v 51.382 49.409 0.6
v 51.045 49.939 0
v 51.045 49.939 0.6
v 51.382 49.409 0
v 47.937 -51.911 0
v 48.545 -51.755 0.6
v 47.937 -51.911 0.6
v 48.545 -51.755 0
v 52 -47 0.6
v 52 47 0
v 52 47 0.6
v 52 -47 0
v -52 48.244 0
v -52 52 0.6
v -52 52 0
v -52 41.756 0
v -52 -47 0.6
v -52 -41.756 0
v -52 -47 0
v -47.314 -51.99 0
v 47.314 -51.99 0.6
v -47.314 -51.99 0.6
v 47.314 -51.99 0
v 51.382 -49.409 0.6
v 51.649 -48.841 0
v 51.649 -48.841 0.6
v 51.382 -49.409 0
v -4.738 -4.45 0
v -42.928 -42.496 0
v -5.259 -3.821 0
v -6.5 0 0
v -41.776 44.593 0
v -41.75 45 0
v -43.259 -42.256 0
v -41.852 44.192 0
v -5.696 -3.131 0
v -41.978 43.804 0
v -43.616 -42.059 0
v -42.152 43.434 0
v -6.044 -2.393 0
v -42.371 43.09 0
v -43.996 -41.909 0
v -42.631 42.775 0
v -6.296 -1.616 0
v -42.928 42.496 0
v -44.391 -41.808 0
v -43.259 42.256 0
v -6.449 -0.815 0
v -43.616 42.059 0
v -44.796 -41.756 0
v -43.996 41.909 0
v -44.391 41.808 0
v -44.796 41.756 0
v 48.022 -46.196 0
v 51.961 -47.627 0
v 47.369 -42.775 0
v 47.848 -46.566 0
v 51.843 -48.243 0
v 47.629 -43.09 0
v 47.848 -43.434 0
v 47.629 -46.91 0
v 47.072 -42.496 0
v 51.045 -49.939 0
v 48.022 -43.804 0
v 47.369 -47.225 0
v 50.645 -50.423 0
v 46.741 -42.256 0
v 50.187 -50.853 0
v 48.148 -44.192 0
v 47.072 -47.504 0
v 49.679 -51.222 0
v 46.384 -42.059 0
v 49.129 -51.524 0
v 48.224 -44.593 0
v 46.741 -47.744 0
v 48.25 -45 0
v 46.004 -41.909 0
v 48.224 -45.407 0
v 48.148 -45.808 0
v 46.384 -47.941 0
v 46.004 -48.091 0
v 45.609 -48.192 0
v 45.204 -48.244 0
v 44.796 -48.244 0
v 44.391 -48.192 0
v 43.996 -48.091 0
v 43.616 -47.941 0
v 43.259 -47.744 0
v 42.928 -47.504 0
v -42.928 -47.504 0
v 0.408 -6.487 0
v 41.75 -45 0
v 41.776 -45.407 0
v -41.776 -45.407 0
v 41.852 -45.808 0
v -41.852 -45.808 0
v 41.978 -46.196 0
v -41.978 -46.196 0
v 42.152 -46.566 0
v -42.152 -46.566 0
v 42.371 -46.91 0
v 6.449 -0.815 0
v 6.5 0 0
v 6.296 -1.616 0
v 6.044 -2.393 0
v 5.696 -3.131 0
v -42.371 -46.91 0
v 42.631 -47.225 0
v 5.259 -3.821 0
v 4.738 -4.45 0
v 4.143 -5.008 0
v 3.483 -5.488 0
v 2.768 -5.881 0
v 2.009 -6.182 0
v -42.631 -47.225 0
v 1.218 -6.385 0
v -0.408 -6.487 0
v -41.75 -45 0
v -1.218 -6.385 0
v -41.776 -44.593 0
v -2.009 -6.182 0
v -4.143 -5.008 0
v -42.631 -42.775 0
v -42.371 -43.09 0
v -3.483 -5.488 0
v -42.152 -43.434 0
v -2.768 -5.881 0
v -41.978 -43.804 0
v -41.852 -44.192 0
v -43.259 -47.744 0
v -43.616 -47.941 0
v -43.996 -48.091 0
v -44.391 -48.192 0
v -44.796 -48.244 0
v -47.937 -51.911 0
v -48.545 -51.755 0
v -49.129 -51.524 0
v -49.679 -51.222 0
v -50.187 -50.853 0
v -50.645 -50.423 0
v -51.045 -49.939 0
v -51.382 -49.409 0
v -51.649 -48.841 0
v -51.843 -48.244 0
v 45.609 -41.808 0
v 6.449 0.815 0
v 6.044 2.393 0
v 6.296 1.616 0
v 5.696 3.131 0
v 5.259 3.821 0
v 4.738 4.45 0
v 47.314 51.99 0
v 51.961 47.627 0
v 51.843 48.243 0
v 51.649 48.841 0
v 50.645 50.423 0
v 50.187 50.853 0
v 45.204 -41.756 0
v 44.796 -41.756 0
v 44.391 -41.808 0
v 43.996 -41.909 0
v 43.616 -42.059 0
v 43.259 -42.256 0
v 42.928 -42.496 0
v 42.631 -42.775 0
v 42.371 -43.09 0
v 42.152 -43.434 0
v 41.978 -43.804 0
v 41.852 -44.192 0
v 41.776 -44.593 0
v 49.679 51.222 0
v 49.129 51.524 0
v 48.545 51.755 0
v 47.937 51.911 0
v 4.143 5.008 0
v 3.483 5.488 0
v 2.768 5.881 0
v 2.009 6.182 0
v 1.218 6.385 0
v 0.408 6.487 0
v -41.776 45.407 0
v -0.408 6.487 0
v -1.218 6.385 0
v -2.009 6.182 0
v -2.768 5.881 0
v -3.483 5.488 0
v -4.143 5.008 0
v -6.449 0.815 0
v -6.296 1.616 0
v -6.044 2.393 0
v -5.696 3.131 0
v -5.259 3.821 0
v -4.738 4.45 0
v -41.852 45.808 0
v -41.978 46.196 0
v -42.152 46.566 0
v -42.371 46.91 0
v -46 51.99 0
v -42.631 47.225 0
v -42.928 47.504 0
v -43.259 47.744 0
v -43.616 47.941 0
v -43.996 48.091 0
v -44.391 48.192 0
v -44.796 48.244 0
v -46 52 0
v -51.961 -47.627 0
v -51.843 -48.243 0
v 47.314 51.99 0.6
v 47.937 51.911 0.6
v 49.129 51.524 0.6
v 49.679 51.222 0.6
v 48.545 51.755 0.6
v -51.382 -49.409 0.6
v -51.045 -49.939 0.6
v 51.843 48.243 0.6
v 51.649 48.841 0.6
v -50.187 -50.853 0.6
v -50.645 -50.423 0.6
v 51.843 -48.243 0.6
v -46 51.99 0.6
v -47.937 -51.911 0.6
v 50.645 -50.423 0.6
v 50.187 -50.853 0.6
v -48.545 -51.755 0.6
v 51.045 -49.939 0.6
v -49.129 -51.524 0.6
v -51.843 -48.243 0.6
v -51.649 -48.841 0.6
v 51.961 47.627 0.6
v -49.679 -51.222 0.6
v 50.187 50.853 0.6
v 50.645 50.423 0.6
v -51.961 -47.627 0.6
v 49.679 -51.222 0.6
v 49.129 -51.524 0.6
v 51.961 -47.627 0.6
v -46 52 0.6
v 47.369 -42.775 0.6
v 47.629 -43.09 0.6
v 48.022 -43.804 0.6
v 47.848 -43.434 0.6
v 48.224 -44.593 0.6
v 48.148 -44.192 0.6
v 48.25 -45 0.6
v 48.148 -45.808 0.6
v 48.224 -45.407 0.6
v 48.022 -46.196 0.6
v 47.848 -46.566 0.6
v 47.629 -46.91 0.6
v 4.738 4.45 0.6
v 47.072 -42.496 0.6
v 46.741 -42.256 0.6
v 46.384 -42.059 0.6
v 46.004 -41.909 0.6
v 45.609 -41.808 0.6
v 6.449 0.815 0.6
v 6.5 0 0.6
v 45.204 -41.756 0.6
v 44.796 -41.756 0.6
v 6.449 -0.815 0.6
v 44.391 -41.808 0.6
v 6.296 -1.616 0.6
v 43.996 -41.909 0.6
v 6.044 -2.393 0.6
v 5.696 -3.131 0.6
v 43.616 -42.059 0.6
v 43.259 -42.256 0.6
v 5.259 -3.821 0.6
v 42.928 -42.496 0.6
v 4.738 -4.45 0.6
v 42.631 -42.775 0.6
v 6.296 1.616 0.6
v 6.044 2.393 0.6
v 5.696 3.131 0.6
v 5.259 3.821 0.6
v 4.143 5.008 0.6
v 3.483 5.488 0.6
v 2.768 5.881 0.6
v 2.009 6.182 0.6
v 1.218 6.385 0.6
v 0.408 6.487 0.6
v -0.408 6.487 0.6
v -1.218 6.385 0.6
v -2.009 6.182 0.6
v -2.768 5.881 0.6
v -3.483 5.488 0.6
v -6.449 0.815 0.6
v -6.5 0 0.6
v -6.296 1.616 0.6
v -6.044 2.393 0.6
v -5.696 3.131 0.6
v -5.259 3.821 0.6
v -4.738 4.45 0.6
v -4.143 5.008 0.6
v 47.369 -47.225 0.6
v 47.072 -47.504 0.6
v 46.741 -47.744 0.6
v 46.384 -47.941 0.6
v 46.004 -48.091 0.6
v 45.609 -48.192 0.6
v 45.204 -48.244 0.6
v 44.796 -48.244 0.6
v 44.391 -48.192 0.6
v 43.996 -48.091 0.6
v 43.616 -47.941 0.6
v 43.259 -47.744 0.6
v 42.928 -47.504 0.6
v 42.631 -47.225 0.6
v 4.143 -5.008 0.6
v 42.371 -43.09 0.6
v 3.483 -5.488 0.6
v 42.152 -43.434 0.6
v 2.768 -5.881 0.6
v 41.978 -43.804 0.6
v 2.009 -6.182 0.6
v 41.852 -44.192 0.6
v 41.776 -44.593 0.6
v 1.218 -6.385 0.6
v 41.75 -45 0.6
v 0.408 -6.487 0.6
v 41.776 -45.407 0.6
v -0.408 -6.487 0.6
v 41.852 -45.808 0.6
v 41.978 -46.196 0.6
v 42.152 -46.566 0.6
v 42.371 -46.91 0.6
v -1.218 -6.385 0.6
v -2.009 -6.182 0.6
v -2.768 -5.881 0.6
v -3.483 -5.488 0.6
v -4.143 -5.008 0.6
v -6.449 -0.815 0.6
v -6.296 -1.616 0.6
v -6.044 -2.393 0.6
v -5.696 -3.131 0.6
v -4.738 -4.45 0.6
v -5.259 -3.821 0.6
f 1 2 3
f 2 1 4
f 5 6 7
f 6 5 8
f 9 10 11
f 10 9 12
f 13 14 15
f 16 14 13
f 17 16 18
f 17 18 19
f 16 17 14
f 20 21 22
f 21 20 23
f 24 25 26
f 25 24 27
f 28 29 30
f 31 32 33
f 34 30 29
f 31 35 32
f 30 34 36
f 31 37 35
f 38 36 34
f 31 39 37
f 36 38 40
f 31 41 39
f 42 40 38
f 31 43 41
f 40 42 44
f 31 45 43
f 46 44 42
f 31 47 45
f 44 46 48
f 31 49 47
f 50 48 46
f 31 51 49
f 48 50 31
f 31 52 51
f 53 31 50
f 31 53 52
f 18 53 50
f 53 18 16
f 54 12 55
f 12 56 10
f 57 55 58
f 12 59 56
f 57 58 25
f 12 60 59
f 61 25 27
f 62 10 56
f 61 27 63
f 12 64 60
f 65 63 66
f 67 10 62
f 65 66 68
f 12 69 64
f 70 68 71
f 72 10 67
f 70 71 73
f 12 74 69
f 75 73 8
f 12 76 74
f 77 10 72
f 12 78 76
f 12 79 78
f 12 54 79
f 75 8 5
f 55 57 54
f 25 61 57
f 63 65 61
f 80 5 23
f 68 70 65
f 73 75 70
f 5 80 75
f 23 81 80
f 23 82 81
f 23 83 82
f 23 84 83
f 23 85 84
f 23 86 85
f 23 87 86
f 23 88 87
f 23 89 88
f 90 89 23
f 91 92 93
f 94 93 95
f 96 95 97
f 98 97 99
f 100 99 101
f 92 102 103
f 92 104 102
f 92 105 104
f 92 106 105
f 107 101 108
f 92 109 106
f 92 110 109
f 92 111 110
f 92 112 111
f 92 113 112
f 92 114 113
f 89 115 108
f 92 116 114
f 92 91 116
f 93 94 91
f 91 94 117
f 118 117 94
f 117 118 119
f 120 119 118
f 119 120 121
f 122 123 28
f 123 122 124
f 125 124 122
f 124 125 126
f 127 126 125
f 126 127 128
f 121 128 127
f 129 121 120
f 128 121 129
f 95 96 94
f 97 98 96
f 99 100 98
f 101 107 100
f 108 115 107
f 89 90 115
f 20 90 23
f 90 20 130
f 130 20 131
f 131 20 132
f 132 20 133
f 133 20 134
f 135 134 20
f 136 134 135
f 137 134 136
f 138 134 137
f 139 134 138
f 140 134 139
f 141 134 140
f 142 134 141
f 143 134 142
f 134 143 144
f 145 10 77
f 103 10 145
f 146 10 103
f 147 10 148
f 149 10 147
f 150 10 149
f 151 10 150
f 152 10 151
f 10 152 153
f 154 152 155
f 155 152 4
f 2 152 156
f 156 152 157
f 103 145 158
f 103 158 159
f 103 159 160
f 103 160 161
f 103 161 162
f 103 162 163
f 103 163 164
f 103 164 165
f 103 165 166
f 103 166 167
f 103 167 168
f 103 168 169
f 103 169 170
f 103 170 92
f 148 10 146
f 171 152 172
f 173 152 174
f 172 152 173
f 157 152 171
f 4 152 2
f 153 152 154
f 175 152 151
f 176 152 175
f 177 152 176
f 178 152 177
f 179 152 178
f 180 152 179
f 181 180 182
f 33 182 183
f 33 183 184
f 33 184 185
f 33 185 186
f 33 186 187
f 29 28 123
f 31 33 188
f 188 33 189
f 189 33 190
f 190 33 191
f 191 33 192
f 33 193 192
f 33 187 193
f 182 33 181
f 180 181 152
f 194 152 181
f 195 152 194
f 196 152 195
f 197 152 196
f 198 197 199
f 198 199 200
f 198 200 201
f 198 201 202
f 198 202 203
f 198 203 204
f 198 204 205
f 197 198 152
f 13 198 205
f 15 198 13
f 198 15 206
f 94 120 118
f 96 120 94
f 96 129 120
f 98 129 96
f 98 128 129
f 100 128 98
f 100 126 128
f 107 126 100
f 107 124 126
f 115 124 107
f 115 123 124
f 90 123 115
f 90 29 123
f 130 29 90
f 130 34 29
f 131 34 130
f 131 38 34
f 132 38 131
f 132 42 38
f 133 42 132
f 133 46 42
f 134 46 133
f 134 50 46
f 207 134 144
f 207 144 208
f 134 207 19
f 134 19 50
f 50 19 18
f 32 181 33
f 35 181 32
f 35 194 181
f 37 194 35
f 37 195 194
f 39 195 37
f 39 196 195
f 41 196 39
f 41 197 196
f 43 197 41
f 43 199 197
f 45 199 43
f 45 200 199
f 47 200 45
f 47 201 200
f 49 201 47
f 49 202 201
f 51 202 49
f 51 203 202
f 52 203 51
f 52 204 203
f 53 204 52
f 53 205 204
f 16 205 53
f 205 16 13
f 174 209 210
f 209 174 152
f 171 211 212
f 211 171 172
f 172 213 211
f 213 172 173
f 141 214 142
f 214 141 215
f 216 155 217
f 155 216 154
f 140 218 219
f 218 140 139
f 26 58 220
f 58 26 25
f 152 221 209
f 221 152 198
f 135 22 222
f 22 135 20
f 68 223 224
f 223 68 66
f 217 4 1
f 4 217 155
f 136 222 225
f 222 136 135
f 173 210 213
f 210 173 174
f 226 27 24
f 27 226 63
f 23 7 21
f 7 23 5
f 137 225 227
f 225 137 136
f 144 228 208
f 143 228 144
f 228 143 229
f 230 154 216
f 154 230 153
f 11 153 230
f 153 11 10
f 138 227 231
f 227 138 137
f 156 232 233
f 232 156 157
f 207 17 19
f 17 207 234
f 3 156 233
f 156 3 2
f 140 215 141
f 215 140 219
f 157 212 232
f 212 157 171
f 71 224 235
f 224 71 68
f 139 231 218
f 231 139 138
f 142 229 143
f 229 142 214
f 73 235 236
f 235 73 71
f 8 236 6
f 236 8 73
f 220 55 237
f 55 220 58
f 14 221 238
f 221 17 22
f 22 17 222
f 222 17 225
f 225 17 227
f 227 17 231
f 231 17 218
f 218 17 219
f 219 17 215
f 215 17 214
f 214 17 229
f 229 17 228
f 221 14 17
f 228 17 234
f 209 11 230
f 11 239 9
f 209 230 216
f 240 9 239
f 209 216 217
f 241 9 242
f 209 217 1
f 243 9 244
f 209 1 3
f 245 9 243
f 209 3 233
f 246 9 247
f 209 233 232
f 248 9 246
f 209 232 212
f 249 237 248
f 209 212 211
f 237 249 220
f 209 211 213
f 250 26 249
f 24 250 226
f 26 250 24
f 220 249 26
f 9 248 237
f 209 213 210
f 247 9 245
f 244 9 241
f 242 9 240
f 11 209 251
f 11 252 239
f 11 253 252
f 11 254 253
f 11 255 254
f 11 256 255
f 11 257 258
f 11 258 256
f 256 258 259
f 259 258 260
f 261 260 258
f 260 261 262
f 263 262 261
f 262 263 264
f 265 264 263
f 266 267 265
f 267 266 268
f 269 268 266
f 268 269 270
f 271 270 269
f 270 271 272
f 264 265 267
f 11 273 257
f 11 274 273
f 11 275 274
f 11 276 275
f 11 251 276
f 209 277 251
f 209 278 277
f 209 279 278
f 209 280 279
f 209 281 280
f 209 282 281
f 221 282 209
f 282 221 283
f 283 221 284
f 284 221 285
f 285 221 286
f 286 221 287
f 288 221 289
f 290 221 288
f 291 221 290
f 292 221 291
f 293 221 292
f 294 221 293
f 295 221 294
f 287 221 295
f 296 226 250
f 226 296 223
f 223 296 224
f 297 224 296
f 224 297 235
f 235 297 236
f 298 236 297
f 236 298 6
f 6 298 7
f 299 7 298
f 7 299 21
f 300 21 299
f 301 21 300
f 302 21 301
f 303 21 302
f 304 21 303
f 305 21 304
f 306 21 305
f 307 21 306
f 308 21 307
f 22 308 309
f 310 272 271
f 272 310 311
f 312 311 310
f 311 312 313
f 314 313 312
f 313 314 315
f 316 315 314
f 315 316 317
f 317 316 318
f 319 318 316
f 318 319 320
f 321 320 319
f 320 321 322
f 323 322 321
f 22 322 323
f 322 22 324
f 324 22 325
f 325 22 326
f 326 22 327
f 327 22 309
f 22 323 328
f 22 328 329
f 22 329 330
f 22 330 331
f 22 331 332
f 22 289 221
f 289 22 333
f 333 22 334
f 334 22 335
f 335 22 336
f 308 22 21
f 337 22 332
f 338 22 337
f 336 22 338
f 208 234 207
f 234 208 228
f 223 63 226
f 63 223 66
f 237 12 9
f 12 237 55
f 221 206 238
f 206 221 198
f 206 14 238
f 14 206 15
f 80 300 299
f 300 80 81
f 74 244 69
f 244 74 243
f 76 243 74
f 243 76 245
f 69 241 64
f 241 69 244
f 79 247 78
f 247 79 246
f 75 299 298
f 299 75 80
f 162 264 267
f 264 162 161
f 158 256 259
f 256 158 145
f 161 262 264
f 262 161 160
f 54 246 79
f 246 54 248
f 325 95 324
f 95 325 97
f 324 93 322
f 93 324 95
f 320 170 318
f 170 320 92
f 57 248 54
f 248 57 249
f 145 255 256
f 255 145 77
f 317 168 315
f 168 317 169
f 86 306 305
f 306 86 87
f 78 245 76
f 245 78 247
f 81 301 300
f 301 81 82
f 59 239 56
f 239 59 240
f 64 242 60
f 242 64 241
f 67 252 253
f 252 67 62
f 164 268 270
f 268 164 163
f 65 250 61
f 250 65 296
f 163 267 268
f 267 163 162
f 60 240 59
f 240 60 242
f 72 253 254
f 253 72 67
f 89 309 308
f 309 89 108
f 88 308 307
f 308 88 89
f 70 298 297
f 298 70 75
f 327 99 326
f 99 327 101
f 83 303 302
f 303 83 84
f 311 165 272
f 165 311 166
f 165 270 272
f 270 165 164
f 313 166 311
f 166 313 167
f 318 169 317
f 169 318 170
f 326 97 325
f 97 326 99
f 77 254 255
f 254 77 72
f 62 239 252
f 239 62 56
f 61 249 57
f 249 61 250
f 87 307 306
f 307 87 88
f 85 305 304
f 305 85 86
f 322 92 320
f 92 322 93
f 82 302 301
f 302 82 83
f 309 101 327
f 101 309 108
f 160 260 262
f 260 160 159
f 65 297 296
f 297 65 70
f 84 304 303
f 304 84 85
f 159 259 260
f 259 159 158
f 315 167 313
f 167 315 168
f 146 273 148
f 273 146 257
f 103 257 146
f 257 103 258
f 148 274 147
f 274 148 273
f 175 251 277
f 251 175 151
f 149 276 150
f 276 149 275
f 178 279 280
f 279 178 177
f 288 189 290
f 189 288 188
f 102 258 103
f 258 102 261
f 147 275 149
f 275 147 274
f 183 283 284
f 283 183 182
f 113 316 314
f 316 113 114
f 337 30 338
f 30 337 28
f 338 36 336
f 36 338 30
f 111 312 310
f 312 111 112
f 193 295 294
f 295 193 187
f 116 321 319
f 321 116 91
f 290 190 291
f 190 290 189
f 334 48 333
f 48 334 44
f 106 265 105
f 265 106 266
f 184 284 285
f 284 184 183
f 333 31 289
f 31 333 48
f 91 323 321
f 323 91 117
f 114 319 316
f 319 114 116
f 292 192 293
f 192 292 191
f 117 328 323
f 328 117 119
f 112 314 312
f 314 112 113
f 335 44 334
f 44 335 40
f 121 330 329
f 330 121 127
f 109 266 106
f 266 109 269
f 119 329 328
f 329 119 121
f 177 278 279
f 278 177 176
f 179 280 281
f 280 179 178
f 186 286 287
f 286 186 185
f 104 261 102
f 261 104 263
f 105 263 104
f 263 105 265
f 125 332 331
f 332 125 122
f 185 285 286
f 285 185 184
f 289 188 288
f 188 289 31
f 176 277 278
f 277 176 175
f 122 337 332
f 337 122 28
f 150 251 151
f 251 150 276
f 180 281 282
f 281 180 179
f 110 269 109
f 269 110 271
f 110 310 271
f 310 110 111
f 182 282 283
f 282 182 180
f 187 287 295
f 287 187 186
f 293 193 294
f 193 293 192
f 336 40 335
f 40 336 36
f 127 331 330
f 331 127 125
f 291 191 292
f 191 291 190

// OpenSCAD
$fn = 50;


difference() {
	union() {
		hull() {
			translate(v = [-47.0000000000, 47.0000000000, 0]) {
				cylinder(h = 0.6000000000, r = 5);
			}
			translate(v = [47.0000000000, 47.0000000000, 0]) {
				cylinder(h = 0.6000000000, r = 5);
			}
			translate(v = [-47.0000000000, -47.0000000000, 0]) {
				cylinder(h = 0.6000000000, r = 5);
			}
			translate(v = [47.0000000000, -47.0000000000, 0]) {
				cylinder(h = 0.6000000000, r = 5);
			}
		}
		translate(v = [-52.0000000000, 46.0000000000, 0]) {
			cube(size = [6, 6, 0.6000000000]);
		}
	}
	union() {
		translate(v = [-52.5000000000, -45.0000000000, -250.0000000000]) {
			rotate(a = [0, 0, 0]) {
				difference() {
					union() {
						hull() {
							translate(v = [7.5000000000, 0, 0]) {
								cylinder(h = 250, r = 3.2500000000, r1 = 3.2500000000, r2 = 3.2500000000);
							}
							translate(v = [-7.5000000000, 0, 0]) {
								cylinder(h = 250, r = 3.2500000000, r1 = 3.2500000000, r2 = 3.2500000000);
							}
						}
					}
					union();
				}
			}
		}
		translate(v = [-52.5000000000, 45.0000000000, -250.0000000000]) {
			rotate(a = [0, 0, 0]) {
				difference() {
					union() {
						hull() {
							translate(v = [7.5000000000, 0, 0]) {
								cylinder(h = 250, r = 3.2500000000, r1 = 3.2500000000, r2 = 3.2500000000);
							}
							translate(v = [-7.5000000000, 0, 0]) {
								cylinder(h = 250, r = 3.2500000000, r1 = 3.2500000000, r2 = 3.2500000000);
							}
						}
					}
					union();
				}
			}
		}
		translate(v = [45.0000000000, -45.0000000000, 0]) {
			cylinder(h = 100, r = 3.2500000000);
		}
		cylinder(h = 0.6000000000, r = 6.5000000000);
	}
}
